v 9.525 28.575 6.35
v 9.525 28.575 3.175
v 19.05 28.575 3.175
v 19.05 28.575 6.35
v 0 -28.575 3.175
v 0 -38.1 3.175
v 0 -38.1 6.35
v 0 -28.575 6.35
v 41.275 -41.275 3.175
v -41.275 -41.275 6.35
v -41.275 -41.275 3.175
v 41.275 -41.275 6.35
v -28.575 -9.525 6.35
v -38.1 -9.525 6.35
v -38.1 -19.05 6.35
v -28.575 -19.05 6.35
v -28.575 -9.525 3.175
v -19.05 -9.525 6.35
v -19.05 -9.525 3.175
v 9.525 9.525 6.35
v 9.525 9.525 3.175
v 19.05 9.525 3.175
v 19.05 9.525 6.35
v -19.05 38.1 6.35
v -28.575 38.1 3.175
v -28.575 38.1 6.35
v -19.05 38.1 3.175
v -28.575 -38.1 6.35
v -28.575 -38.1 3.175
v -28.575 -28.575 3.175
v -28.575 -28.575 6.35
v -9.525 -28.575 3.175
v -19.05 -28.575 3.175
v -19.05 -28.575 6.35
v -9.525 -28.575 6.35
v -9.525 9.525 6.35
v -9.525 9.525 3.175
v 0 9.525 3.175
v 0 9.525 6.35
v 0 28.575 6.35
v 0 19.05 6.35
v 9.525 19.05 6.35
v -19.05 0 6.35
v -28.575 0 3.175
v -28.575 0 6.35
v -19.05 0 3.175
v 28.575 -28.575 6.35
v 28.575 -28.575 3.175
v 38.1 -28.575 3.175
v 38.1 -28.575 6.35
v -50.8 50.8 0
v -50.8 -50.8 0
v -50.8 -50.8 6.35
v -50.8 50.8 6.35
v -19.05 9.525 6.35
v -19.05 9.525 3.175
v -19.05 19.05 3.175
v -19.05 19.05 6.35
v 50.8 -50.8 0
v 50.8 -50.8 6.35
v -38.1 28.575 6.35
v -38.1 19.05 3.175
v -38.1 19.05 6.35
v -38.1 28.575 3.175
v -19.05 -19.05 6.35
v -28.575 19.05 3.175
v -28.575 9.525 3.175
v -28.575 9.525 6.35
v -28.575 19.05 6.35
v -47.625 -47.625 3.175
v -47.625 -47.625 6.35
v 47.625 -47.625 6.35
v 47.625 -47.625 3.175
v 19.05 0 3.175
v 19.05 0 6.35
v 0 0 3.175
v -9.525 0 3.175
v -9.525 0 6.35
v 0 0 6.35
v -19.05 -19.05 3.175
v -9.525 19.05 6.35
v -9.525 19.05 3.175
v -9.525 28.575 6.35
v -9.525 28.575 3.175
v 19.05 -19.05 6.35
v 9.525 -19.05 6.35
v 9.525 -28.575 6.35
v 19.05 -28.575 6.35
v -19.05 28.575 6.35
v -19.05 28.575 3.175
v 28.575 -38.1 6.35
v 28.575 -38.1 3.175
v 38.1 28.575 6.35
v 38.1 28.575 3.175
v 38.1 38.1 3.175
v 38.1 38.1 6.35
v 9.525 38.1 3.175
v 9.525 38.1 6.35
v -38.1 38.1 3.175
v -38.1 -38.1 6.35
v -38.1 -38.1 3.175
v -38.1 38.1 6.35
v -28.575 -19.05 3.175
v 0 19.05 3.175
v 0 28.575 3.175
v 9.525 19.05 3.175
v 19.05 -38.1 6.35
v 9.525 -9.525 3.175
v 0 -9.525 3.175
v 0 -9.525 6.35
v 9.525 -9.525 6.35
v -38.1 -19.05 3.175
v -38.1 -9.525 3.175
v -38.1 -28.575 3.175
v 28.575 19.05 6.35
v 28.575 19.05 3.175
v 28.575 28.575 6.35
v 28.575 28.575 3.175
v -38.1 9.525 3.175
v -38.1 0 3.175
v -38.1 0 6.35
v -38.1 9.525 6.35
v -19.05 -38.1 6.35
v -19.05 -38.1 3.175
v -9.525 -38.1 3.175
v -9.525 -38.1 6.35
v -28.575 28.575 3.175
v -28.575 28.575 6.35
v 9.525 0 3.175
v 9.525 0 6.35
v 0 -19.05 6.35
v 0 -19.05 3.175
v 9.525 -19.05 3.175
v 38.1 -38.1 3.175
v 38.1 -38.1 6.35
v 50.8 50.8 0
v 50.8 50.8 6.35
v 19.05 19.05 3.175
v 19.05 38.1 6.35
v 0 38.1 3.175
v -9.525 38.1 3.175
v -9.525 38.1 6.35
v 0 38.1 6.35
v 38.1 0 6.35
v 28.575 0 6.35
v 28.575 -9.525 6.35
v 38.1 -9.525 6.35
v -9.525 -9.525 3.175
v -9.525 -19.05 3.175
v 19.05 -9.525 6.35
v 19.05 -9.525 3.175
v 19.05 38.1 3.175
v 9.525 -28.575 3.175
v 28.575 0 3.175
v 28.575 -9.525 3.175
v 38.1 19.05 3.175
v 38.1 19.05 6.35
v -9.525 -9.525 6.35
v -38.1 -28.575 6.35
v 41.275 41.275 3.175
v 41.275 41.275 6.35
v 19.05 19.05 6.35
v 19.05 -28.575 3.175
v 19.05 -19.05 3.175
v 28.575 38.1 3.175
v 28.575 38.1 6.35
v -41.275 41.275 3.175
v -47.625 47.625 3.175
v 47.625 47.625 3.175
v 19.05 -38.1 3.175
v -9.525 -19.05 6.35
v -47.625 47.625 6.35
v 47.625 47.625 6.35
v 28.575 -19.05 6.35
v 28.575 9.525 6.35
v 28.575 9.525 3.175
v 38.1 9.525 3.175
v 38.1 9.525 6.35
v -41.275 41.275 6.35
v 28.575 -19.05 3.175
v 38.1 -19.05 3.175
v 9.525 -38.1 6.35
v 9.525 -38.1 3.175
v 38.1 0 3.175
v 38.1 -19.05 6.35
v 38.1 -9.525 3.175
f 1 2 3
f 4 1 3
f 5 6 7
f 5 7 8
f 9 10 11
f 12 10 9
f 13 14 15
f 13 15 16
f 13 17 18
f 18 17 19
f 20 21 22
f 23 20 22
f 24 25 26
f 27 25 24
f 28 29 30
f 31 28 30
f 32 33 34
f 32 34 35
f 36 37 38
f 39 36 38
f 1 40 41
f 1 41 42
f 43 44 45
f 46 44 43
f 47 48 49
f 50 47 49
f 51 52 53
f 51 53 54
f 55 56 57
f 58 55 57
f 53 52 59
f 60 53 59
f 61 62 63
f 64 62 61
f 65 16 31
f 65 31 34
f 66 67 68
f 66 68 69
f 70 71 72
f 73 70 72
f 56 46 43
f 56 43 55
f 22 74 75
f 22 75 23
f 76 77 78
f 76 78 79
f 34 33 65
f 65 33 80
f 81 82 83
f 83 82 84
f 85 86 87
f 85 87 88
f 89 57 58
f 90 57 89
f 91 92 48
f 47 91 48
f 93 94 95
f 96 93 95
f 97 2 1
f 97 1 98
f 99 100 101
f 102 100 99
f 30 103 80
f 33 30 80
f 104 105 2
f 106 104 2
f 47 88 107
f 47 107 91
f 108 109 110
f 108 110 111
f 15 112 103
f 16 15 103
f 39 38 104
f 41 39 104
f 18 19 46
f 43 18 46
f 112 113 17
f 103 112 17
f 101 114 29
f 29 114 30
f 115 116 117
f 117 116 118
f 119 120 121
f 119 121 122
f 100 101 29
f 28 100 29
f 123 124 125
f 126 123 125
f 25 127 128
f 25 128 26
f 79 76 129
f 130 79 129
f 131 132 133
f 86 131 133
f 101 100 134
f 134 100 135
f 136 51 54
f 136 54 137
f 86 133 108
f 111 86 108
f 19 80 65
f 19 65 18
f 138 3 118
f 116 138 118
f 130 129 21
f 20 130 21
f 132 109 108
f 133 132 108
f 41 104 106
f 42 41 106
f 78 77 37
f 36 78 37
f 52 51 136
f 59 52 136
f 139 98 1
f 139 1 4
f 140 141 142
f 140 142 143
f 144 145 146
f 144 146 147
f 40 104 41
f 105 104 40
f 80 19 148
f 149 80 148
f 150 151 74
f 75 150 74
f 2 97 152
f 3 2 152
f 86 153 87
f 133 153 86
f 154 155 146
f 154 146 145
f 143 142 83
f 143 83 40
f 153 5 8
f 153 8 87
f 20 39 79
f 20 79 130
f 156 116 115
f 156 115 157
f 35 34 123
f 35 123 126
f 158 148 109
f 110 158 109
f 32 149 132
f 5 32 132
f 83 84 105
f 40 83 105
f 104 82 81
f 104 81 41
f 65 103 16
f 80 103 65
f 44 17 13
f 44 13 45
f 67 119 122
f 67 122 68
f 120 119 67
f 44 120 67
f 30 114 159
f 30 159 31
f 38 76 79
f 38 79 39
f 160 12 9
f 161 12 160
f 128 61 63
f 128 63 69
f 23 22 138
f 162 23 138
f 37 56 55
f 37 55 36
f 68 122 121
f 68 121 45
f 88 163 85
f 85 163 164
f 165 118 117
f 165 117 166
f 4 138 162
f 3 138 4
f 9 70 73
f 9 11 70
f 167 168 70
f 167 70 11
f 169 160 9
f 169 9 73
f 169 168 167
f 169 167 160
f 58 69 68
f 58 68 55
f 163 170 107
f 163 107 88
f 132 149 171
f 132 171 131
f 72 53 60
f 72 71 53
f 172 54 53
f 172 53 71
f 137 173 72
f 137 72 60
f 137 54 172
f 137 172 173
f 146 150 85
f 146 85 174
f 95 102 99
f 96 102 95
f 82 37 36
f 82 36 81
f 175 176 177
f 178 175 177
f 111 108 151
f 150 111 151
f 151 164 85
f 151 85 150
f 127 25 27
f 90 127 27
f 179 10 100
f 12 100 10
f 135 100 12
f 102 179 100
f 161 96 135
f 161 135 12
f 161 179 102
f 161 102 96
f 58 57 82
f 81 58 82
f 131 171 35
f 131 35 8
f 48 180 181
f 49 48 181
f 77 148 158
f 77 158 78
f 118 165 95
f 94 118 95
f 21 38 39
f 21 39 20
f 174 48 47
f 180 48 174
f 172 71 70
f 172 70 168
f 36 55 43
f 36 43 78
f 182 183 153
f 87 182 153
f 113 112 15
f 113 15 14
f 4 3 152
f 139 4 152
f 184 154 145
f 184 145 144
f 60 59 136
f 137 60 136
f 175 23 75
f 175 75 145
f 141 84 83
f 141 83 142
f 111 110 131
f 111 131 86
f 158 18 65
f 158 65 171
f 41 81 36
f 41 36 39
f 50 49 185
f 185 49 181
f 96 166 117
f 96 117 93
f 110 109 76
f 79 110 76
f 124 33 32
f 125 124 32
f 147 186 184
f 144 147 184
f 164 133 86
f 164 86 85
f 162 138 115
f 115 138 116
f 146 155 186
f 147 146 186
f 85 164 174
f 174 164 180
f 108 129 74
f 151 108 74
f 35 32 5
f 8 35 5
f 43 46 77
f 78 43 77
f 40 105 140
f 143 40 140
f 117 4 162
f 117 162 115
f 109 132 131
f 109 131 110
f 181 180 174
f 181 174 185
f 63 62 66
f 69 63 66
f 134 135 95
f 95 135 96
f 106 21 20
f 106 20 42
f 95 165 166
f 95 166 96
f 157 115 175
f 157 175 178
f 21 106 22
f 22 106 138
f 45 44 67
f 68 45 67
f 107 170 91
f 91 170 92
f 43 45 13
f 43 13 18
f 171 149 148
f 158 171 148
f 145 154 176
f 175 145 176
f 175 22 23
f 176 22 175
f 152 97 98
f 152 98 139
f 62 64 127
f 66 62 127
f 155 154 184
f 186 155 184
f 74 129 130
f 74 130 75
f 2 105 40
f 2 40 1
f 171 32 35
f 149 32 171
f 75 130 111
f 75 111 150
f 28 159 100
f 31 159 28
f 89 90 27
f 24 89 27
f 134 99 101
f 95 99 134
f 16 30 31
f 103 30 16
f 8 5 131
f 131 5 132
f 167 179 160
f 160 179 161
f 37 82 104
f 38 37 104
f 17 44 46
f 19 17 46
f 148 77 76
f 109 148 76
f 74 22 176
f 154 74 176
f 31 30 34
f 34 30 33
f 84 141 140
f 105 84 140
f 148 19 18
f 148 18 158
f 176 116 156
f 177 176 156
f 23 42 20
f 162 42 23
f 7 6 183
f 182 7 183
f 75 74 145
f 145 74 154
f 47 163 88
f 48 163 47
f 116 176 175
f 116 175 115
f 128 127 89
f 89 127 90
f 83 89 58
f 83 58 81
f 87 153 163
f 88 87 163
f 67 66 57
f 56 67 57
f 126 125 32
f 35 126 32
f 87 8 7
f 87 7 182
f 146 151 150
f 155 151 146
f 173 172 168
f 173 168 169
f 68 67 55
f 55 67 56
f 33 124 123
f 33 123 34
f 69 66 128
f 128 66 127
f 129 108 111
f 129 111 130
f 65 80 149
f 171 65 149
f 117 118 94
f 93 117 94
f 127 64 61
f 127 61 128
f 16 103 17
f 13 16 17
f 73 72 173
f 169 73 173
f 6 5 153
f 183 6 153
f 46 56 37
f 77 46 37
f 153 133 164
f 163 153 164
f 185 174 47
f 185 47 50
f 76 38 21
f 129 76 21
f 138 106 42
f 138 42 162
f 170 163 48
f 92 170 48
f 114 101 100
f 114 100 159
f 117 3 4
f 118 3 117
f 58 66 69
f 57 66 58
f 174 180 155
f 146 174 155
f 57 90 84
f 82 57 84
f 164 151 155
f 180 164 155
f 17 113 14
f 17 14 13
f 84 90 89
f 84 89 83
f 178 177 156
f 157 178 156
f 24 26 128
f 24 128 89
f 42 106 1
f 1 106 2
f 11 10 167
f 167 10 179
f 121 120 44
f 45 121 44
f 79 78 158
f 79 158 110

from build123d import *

# Parameters (mm, degrees)
F0_W     = 101.6
F0_H     = 101.6
F1_DEPTH = 6.35
F2_W     = 95.25
F2_H     = 95.25
F2_W_2   = 82.55
F2_H_2   = 82.55
F3_DEPTH = 3.175
F2_W_3   = 76.2
F2_H_3   = 76.2
F4_DEPTH = 3.175
F5_W     = 9.525
F5_H     = 9.525
F6_DEPTH = 3.175


with BuildPart() as f1:
    # F0 (on Top) → F1 (new body)
    with BuildSketch(Plane.XY):
        Rectangle(F0_W, F0_H)
    extrude(amount=F1_DEPTH)

    # F2 (on face) → F3 (cut)
    with BuildSketch(Plane.XY.offset(6.35)):
        Rectangle(F2_W, F2_H)
        Rectangle(F2_W_2, F2_H_2, mode=Mode.SUBTRACT)
    extrude(amount=-F3_DEPTH, mode=Mode.SUBTRACT)

    # F2 (on face) → F4 (cut)
    with BuildSketch(Plane.XY.offset(6.35)):
        Rectangle(F2_W_3, F2_H_3)
    extrude(amount=-F4_DEPTH, mode=Mode.SUBTRACT)


with BuildPart() as f6:
    # F5 (on face) → F6 (new body)
    with BuildSketch(Plane.XY.offset(3.175)):
        with Locations((23.8125, -33.3375)):
            Rectangle(F5_W, F5_H)
    extrude(amount=F6_DEPTH)


with BuildPart() as f6b:
    # F5 (on face) → F6, piece 2 (new body)
    with BuildSketch(Plane.XY.offset(3.175)):
        with Locations((4.7625, -33.3375)):
            Rectangle(F5_W, F5_H)
    extrude(amount=F6_DEPTH)


with BuildPart() as f6c:
    # F5 (on face) → F6, piece 3 (new body)
    with BuildSketch(Plane.XY.offset(3.175)):
        with Locations((-14.2875, -33.3375)):
            Rectangle(F5_W, F5_H)
    extrude(amount=F6_DEPTH)


with BuildPart() as f6d:
    # F5 (on face) → F6, piece 4 (new body)
    with BuildSketch(Plane.XY.offset(3.175)):
        with Locations((-33.3375, -33.3375)):
            Rectangle(F5_W, F5_H)
    extrude(amount=F6_DEPTH)


with BuildPart() as f6e:
    # F5 (on face) → F6, piece 5 (new body)
    with BuildSketch(Plane.XY.offset(3.175)):
        with Locations((-23.8125, -23.8125)):
            Rectangle(F5_W, F5_H)
    extrude(amount=F6_DEPTH)


with BuildPart() as f6f:
    # F5 (on face) → F6, piece 6 (new body)
    with BuildSketch(Plane.XY.offset(3.175)):
        with Locations((-33.3375, -14.2875)):
            Rectangle(F5_W, F5_H)
    extrude(amount=F6_DEPTH)


with BuildPart() as f6g:
    # F5 (on face) → F6, piece 7 (new body)
    with BuildSketch(Plane.XY.offset(3.175)):
        with Locations((-14.2875, -14.2875)):
            Rectangle(F5_W, F5_H)
    extrude(amount=F6_DEPTH)


with BuildPart() as f6h:
    # F5 (on face) → F6, piece 8 (new body)
    with BuildSketch(Plane.XY.offset(3.175)):
        with Locations((-23.8125, -4.7625)):
            Rectangle(F5_W, F5_H)
    extrude(amount=F6_DEPTH)


with BuildPart() as f6i:
    # F5 (on face) → F6, piece 9 (new body)
    with BuildSketch(Plane.XY.offset(3.175)):
        with Locations((-33.3375, 4.7625)):
            Rectangle(F5_W, F5_H)
    extrude(amount=F6_DEPTH)


with BuildPart() as f6j:
    # F5 (on face) → F6, piece 10 (new body)
    with BuildSketch(Plane.XY.offset(3.175)):
        with Locations((-14.2875, 4.7625)):
            Rectangle(F5_W, F5_H)
    extrude(amount=F6_DEPTH)


with BuildPart() as f6k:
    # F5 (on face) → F6, piece 11 (new body)
    with BuildSketch(Plane.XY.offset(3.175)):
        with Locations((-23.8125, 14.2875)):
            Rectangle(F5_W, F5_H)
    extrude(amount=F6_DEPTH)


with BuildPart() as f6l:
    # F5 (on face) → F6, piece 12 (new body)
    with BuildSketch(Plane.XY.offset(3.175)):
        with Locations((-33.3375, 23.8125)):
            Rectangle(F5_W, F5_H)
    extrude(amount=F6_DEPTH)


with BuildPart() as f6m:
    # F5 (on face) → F6, piece 13 (new body)
    with BuildSketch(Plane.XY.offset(3.175)):
        with Locations((-14.2875, 23.8125)):
            Rectangle(F5_W, F5_H)
    extrude(amount=F6_DEPTH)


with BuildPart() as f6n:
    # F5 (on face) → F6, piece 14 (new body)
    with BuildSketch(Plane.XY.offset(3.175)):
        with Locations((-23.8125, 33.3375)):
            Rectangle(F5_W, F5_H)
    extrude(amount=F6_DEPTH)


with BuildPart() as f6o:
    # F5 (on face) → F6, piece 15 (new body)
    with BuildSketch(Plane.XY.offset(3.175)):
        with Locations((-4.7625, 33.3375)):
            Rectangle(F5_W, F5_H)
    extrude(amount=F6_DEPTH)


with BuildPart() as f6p:
    # F5 (on face) → F6, piece 16 (new body)
    with BuildSketch(Plane.XY.offset(3.175)):
        with Locations((4.7625, 23.8125)):
            Rectangle(F5_W, F5_H)
    extrude(amount=F6_DEPTH)


with BuildPart() as f6q:
    # F5 (on face) → F6, piece 17 (new body)
    with BuildSketch(Plane.XY.offset(3.175)):
        with Locations((-4.7625, 14.2875)):
            Rectangle(F5_W, F5_H)
    extrude(amount=F6_DEPTH)


with BuildPart() as f6r:
    # F5 (on face) → F6, piece 18 (new body)
    with BuildSketch(Plane.XY.offset(3.175)):
        with Locations((4.7625, 4.7625)):
            Rectangle(F5_W, F5_H)
    extrude(amount=F6_DEPTH)


with BuildPart() as f6s:
    # F5 (on face) → F6, piece 19 (new body)
    with BuildSketch(Plane.XY.offset(3.175)):
        with Locations((-4.7625, -4.7625)):
            Rectangle(F5_W, F5_H)
    extrude(amount=F6_DEPTH)


with BuildPart() as f6t:
    # F5 (on face) → F6, piece 20 (new body)
    with BuildSketch(Plane.XY.offset(3.175)):
        with Locations((4.7625, -14.2875)):
            Rectangle(F5_W, F5_H)
    extrude(amount=F6_DEPTH)


with BuildPart() as f6u:
    # F5 (on face) → F6, piece 21 (new body)
    with BuildSketch(Plane.XY.offset(3.175)):
        with Locations((-4.7625, -23.8125)):
            Rectangle(F5_W, F5_H)
    extrude(amount=F6_DEPTH)


with BuildPart() as f6v:
    # F5 (on face) → F6, piece 22 (new body)
    with BuildSketch(Plane.XY.offset(3.175)):
        with Locations((14.2875, -23.8125)):
            Rectangle(F5_W, F5_H)
    extrude(amount=F6_DEPTH)


with BuildPart() as f6w:
    # F5 (on face) → F6, piece 23 (new body)
    with BuildSketch(Plane.XY.offset(3.175)):
        with Locations((23.8125, -14.2875)):
            Rectangle(F5_W, F5_H)
    extrude(amount=F6_DEPTH)


with BuildPart() as f6x:
    # F5 (on face) → F6, piece 24 (new body)
    with BuildSketch(Plane.XY.offset(3.175)):
        with Locations((14.2875, -4.7625)):
            Rectangle(F5_W, F5_H)
    extrude(amount=F6_DEPTH)


with BuildPart() as f6y:
    # F5 (on face) → F6, piece 25 (new body)
    with BuildSketch(Plane.XY.offset(3.175)):
        with Locations((23.8125, 4.7625)):
            Rectangle(F5_W, F5_H)
    extrude(amount=F6_DEPTH)


with BuildPart() as f6z:
    # F5 (on face) → F6, piece 26 (new body)
    with BuildSketch(Plane.XY.offset(3.175)):
        with Locations((14.2875, 14.2875)):
            Rectangle(F5_W, F5_H)
    extrude(amount=F6_DEPTH)


with BuildPart() as f6ba:
    # F5 (on face) → F6, piece 27 (new body)
    with BuildSketch(Plane.XY.offset(3.175)):
        with Locations((23.8125, 23.8125)):
            Rectangle(F5_W, F5_H)
    extrude(amount=F6_DEPTH)


with BuildPart() as f6bb:
    # F5 (on face) → F6, piece 28 (new body)
    with BuildSketch(Plane.XY.offset(3.175)):
        with Locations((14.2875, 33.3375)):
            Rectangle(F5_W, F5_H)
    extrude(amount=F6_DEPTH)


with BuildPart() as f6bc:
    # F5 (on face) → F6, piece 29 (new body)
    with BuildSketch(Plane.XY.offset(3.175)):
        with Locations((33.3375, 33.3375)):
            Rectangle(F5_W, F5_H)
    extrude(amount=F6_DEPTH)


with BuildPart() as f6bd:
    # F5 (on face) → F6, piece 30 (new body)
    with BuildSketch(Plane.XY.offset(3.175)):
        with Locations((33.3375, 14.2875)):
            Rectangle(F5_W, F5_H)
    extrude(amount=F6_DEPTH)


with BuildPart() as f6be:
    # F5 (on face) → F6, piece 31 (new body)
    with BuildSketch(Plane.XY.offset(3.175)):
        with Locations((33.3375, -4.7625)):
            Rectangle(F5_W, F5_H)
    extrude(amount=F6_DEPTH)


with BuildPart() as f6bf:
    # F5 (on face) → F6, piece 32 (new body)
    with BuildSketch(Plane.XY.offset(3.175)):
        with Locations((33.3375, -23.8125)):
            Rectangle(F5_W, F5_H)
    extrude(amount=F6_DEPTH)


solid = Compound([f1.part, f6.part, f6b.part, f6c.part, f6d.part, f6e.part, f6f.part, f6g.part, f6h.part, f6i.part, f6j.part, f6k.part, f6l.part, f6m.part, f6n.part, f6o.part, f6p.part, f6q.part, f6r.part, f6s.part, f6t.part, f6u.part, f6v.part, f6w.part, f6x.part, f6y.part, f6z.part, f6ba.part, f6bb.part, f6bc.part, f6bd.part, f6be.part, f6bf.part])
